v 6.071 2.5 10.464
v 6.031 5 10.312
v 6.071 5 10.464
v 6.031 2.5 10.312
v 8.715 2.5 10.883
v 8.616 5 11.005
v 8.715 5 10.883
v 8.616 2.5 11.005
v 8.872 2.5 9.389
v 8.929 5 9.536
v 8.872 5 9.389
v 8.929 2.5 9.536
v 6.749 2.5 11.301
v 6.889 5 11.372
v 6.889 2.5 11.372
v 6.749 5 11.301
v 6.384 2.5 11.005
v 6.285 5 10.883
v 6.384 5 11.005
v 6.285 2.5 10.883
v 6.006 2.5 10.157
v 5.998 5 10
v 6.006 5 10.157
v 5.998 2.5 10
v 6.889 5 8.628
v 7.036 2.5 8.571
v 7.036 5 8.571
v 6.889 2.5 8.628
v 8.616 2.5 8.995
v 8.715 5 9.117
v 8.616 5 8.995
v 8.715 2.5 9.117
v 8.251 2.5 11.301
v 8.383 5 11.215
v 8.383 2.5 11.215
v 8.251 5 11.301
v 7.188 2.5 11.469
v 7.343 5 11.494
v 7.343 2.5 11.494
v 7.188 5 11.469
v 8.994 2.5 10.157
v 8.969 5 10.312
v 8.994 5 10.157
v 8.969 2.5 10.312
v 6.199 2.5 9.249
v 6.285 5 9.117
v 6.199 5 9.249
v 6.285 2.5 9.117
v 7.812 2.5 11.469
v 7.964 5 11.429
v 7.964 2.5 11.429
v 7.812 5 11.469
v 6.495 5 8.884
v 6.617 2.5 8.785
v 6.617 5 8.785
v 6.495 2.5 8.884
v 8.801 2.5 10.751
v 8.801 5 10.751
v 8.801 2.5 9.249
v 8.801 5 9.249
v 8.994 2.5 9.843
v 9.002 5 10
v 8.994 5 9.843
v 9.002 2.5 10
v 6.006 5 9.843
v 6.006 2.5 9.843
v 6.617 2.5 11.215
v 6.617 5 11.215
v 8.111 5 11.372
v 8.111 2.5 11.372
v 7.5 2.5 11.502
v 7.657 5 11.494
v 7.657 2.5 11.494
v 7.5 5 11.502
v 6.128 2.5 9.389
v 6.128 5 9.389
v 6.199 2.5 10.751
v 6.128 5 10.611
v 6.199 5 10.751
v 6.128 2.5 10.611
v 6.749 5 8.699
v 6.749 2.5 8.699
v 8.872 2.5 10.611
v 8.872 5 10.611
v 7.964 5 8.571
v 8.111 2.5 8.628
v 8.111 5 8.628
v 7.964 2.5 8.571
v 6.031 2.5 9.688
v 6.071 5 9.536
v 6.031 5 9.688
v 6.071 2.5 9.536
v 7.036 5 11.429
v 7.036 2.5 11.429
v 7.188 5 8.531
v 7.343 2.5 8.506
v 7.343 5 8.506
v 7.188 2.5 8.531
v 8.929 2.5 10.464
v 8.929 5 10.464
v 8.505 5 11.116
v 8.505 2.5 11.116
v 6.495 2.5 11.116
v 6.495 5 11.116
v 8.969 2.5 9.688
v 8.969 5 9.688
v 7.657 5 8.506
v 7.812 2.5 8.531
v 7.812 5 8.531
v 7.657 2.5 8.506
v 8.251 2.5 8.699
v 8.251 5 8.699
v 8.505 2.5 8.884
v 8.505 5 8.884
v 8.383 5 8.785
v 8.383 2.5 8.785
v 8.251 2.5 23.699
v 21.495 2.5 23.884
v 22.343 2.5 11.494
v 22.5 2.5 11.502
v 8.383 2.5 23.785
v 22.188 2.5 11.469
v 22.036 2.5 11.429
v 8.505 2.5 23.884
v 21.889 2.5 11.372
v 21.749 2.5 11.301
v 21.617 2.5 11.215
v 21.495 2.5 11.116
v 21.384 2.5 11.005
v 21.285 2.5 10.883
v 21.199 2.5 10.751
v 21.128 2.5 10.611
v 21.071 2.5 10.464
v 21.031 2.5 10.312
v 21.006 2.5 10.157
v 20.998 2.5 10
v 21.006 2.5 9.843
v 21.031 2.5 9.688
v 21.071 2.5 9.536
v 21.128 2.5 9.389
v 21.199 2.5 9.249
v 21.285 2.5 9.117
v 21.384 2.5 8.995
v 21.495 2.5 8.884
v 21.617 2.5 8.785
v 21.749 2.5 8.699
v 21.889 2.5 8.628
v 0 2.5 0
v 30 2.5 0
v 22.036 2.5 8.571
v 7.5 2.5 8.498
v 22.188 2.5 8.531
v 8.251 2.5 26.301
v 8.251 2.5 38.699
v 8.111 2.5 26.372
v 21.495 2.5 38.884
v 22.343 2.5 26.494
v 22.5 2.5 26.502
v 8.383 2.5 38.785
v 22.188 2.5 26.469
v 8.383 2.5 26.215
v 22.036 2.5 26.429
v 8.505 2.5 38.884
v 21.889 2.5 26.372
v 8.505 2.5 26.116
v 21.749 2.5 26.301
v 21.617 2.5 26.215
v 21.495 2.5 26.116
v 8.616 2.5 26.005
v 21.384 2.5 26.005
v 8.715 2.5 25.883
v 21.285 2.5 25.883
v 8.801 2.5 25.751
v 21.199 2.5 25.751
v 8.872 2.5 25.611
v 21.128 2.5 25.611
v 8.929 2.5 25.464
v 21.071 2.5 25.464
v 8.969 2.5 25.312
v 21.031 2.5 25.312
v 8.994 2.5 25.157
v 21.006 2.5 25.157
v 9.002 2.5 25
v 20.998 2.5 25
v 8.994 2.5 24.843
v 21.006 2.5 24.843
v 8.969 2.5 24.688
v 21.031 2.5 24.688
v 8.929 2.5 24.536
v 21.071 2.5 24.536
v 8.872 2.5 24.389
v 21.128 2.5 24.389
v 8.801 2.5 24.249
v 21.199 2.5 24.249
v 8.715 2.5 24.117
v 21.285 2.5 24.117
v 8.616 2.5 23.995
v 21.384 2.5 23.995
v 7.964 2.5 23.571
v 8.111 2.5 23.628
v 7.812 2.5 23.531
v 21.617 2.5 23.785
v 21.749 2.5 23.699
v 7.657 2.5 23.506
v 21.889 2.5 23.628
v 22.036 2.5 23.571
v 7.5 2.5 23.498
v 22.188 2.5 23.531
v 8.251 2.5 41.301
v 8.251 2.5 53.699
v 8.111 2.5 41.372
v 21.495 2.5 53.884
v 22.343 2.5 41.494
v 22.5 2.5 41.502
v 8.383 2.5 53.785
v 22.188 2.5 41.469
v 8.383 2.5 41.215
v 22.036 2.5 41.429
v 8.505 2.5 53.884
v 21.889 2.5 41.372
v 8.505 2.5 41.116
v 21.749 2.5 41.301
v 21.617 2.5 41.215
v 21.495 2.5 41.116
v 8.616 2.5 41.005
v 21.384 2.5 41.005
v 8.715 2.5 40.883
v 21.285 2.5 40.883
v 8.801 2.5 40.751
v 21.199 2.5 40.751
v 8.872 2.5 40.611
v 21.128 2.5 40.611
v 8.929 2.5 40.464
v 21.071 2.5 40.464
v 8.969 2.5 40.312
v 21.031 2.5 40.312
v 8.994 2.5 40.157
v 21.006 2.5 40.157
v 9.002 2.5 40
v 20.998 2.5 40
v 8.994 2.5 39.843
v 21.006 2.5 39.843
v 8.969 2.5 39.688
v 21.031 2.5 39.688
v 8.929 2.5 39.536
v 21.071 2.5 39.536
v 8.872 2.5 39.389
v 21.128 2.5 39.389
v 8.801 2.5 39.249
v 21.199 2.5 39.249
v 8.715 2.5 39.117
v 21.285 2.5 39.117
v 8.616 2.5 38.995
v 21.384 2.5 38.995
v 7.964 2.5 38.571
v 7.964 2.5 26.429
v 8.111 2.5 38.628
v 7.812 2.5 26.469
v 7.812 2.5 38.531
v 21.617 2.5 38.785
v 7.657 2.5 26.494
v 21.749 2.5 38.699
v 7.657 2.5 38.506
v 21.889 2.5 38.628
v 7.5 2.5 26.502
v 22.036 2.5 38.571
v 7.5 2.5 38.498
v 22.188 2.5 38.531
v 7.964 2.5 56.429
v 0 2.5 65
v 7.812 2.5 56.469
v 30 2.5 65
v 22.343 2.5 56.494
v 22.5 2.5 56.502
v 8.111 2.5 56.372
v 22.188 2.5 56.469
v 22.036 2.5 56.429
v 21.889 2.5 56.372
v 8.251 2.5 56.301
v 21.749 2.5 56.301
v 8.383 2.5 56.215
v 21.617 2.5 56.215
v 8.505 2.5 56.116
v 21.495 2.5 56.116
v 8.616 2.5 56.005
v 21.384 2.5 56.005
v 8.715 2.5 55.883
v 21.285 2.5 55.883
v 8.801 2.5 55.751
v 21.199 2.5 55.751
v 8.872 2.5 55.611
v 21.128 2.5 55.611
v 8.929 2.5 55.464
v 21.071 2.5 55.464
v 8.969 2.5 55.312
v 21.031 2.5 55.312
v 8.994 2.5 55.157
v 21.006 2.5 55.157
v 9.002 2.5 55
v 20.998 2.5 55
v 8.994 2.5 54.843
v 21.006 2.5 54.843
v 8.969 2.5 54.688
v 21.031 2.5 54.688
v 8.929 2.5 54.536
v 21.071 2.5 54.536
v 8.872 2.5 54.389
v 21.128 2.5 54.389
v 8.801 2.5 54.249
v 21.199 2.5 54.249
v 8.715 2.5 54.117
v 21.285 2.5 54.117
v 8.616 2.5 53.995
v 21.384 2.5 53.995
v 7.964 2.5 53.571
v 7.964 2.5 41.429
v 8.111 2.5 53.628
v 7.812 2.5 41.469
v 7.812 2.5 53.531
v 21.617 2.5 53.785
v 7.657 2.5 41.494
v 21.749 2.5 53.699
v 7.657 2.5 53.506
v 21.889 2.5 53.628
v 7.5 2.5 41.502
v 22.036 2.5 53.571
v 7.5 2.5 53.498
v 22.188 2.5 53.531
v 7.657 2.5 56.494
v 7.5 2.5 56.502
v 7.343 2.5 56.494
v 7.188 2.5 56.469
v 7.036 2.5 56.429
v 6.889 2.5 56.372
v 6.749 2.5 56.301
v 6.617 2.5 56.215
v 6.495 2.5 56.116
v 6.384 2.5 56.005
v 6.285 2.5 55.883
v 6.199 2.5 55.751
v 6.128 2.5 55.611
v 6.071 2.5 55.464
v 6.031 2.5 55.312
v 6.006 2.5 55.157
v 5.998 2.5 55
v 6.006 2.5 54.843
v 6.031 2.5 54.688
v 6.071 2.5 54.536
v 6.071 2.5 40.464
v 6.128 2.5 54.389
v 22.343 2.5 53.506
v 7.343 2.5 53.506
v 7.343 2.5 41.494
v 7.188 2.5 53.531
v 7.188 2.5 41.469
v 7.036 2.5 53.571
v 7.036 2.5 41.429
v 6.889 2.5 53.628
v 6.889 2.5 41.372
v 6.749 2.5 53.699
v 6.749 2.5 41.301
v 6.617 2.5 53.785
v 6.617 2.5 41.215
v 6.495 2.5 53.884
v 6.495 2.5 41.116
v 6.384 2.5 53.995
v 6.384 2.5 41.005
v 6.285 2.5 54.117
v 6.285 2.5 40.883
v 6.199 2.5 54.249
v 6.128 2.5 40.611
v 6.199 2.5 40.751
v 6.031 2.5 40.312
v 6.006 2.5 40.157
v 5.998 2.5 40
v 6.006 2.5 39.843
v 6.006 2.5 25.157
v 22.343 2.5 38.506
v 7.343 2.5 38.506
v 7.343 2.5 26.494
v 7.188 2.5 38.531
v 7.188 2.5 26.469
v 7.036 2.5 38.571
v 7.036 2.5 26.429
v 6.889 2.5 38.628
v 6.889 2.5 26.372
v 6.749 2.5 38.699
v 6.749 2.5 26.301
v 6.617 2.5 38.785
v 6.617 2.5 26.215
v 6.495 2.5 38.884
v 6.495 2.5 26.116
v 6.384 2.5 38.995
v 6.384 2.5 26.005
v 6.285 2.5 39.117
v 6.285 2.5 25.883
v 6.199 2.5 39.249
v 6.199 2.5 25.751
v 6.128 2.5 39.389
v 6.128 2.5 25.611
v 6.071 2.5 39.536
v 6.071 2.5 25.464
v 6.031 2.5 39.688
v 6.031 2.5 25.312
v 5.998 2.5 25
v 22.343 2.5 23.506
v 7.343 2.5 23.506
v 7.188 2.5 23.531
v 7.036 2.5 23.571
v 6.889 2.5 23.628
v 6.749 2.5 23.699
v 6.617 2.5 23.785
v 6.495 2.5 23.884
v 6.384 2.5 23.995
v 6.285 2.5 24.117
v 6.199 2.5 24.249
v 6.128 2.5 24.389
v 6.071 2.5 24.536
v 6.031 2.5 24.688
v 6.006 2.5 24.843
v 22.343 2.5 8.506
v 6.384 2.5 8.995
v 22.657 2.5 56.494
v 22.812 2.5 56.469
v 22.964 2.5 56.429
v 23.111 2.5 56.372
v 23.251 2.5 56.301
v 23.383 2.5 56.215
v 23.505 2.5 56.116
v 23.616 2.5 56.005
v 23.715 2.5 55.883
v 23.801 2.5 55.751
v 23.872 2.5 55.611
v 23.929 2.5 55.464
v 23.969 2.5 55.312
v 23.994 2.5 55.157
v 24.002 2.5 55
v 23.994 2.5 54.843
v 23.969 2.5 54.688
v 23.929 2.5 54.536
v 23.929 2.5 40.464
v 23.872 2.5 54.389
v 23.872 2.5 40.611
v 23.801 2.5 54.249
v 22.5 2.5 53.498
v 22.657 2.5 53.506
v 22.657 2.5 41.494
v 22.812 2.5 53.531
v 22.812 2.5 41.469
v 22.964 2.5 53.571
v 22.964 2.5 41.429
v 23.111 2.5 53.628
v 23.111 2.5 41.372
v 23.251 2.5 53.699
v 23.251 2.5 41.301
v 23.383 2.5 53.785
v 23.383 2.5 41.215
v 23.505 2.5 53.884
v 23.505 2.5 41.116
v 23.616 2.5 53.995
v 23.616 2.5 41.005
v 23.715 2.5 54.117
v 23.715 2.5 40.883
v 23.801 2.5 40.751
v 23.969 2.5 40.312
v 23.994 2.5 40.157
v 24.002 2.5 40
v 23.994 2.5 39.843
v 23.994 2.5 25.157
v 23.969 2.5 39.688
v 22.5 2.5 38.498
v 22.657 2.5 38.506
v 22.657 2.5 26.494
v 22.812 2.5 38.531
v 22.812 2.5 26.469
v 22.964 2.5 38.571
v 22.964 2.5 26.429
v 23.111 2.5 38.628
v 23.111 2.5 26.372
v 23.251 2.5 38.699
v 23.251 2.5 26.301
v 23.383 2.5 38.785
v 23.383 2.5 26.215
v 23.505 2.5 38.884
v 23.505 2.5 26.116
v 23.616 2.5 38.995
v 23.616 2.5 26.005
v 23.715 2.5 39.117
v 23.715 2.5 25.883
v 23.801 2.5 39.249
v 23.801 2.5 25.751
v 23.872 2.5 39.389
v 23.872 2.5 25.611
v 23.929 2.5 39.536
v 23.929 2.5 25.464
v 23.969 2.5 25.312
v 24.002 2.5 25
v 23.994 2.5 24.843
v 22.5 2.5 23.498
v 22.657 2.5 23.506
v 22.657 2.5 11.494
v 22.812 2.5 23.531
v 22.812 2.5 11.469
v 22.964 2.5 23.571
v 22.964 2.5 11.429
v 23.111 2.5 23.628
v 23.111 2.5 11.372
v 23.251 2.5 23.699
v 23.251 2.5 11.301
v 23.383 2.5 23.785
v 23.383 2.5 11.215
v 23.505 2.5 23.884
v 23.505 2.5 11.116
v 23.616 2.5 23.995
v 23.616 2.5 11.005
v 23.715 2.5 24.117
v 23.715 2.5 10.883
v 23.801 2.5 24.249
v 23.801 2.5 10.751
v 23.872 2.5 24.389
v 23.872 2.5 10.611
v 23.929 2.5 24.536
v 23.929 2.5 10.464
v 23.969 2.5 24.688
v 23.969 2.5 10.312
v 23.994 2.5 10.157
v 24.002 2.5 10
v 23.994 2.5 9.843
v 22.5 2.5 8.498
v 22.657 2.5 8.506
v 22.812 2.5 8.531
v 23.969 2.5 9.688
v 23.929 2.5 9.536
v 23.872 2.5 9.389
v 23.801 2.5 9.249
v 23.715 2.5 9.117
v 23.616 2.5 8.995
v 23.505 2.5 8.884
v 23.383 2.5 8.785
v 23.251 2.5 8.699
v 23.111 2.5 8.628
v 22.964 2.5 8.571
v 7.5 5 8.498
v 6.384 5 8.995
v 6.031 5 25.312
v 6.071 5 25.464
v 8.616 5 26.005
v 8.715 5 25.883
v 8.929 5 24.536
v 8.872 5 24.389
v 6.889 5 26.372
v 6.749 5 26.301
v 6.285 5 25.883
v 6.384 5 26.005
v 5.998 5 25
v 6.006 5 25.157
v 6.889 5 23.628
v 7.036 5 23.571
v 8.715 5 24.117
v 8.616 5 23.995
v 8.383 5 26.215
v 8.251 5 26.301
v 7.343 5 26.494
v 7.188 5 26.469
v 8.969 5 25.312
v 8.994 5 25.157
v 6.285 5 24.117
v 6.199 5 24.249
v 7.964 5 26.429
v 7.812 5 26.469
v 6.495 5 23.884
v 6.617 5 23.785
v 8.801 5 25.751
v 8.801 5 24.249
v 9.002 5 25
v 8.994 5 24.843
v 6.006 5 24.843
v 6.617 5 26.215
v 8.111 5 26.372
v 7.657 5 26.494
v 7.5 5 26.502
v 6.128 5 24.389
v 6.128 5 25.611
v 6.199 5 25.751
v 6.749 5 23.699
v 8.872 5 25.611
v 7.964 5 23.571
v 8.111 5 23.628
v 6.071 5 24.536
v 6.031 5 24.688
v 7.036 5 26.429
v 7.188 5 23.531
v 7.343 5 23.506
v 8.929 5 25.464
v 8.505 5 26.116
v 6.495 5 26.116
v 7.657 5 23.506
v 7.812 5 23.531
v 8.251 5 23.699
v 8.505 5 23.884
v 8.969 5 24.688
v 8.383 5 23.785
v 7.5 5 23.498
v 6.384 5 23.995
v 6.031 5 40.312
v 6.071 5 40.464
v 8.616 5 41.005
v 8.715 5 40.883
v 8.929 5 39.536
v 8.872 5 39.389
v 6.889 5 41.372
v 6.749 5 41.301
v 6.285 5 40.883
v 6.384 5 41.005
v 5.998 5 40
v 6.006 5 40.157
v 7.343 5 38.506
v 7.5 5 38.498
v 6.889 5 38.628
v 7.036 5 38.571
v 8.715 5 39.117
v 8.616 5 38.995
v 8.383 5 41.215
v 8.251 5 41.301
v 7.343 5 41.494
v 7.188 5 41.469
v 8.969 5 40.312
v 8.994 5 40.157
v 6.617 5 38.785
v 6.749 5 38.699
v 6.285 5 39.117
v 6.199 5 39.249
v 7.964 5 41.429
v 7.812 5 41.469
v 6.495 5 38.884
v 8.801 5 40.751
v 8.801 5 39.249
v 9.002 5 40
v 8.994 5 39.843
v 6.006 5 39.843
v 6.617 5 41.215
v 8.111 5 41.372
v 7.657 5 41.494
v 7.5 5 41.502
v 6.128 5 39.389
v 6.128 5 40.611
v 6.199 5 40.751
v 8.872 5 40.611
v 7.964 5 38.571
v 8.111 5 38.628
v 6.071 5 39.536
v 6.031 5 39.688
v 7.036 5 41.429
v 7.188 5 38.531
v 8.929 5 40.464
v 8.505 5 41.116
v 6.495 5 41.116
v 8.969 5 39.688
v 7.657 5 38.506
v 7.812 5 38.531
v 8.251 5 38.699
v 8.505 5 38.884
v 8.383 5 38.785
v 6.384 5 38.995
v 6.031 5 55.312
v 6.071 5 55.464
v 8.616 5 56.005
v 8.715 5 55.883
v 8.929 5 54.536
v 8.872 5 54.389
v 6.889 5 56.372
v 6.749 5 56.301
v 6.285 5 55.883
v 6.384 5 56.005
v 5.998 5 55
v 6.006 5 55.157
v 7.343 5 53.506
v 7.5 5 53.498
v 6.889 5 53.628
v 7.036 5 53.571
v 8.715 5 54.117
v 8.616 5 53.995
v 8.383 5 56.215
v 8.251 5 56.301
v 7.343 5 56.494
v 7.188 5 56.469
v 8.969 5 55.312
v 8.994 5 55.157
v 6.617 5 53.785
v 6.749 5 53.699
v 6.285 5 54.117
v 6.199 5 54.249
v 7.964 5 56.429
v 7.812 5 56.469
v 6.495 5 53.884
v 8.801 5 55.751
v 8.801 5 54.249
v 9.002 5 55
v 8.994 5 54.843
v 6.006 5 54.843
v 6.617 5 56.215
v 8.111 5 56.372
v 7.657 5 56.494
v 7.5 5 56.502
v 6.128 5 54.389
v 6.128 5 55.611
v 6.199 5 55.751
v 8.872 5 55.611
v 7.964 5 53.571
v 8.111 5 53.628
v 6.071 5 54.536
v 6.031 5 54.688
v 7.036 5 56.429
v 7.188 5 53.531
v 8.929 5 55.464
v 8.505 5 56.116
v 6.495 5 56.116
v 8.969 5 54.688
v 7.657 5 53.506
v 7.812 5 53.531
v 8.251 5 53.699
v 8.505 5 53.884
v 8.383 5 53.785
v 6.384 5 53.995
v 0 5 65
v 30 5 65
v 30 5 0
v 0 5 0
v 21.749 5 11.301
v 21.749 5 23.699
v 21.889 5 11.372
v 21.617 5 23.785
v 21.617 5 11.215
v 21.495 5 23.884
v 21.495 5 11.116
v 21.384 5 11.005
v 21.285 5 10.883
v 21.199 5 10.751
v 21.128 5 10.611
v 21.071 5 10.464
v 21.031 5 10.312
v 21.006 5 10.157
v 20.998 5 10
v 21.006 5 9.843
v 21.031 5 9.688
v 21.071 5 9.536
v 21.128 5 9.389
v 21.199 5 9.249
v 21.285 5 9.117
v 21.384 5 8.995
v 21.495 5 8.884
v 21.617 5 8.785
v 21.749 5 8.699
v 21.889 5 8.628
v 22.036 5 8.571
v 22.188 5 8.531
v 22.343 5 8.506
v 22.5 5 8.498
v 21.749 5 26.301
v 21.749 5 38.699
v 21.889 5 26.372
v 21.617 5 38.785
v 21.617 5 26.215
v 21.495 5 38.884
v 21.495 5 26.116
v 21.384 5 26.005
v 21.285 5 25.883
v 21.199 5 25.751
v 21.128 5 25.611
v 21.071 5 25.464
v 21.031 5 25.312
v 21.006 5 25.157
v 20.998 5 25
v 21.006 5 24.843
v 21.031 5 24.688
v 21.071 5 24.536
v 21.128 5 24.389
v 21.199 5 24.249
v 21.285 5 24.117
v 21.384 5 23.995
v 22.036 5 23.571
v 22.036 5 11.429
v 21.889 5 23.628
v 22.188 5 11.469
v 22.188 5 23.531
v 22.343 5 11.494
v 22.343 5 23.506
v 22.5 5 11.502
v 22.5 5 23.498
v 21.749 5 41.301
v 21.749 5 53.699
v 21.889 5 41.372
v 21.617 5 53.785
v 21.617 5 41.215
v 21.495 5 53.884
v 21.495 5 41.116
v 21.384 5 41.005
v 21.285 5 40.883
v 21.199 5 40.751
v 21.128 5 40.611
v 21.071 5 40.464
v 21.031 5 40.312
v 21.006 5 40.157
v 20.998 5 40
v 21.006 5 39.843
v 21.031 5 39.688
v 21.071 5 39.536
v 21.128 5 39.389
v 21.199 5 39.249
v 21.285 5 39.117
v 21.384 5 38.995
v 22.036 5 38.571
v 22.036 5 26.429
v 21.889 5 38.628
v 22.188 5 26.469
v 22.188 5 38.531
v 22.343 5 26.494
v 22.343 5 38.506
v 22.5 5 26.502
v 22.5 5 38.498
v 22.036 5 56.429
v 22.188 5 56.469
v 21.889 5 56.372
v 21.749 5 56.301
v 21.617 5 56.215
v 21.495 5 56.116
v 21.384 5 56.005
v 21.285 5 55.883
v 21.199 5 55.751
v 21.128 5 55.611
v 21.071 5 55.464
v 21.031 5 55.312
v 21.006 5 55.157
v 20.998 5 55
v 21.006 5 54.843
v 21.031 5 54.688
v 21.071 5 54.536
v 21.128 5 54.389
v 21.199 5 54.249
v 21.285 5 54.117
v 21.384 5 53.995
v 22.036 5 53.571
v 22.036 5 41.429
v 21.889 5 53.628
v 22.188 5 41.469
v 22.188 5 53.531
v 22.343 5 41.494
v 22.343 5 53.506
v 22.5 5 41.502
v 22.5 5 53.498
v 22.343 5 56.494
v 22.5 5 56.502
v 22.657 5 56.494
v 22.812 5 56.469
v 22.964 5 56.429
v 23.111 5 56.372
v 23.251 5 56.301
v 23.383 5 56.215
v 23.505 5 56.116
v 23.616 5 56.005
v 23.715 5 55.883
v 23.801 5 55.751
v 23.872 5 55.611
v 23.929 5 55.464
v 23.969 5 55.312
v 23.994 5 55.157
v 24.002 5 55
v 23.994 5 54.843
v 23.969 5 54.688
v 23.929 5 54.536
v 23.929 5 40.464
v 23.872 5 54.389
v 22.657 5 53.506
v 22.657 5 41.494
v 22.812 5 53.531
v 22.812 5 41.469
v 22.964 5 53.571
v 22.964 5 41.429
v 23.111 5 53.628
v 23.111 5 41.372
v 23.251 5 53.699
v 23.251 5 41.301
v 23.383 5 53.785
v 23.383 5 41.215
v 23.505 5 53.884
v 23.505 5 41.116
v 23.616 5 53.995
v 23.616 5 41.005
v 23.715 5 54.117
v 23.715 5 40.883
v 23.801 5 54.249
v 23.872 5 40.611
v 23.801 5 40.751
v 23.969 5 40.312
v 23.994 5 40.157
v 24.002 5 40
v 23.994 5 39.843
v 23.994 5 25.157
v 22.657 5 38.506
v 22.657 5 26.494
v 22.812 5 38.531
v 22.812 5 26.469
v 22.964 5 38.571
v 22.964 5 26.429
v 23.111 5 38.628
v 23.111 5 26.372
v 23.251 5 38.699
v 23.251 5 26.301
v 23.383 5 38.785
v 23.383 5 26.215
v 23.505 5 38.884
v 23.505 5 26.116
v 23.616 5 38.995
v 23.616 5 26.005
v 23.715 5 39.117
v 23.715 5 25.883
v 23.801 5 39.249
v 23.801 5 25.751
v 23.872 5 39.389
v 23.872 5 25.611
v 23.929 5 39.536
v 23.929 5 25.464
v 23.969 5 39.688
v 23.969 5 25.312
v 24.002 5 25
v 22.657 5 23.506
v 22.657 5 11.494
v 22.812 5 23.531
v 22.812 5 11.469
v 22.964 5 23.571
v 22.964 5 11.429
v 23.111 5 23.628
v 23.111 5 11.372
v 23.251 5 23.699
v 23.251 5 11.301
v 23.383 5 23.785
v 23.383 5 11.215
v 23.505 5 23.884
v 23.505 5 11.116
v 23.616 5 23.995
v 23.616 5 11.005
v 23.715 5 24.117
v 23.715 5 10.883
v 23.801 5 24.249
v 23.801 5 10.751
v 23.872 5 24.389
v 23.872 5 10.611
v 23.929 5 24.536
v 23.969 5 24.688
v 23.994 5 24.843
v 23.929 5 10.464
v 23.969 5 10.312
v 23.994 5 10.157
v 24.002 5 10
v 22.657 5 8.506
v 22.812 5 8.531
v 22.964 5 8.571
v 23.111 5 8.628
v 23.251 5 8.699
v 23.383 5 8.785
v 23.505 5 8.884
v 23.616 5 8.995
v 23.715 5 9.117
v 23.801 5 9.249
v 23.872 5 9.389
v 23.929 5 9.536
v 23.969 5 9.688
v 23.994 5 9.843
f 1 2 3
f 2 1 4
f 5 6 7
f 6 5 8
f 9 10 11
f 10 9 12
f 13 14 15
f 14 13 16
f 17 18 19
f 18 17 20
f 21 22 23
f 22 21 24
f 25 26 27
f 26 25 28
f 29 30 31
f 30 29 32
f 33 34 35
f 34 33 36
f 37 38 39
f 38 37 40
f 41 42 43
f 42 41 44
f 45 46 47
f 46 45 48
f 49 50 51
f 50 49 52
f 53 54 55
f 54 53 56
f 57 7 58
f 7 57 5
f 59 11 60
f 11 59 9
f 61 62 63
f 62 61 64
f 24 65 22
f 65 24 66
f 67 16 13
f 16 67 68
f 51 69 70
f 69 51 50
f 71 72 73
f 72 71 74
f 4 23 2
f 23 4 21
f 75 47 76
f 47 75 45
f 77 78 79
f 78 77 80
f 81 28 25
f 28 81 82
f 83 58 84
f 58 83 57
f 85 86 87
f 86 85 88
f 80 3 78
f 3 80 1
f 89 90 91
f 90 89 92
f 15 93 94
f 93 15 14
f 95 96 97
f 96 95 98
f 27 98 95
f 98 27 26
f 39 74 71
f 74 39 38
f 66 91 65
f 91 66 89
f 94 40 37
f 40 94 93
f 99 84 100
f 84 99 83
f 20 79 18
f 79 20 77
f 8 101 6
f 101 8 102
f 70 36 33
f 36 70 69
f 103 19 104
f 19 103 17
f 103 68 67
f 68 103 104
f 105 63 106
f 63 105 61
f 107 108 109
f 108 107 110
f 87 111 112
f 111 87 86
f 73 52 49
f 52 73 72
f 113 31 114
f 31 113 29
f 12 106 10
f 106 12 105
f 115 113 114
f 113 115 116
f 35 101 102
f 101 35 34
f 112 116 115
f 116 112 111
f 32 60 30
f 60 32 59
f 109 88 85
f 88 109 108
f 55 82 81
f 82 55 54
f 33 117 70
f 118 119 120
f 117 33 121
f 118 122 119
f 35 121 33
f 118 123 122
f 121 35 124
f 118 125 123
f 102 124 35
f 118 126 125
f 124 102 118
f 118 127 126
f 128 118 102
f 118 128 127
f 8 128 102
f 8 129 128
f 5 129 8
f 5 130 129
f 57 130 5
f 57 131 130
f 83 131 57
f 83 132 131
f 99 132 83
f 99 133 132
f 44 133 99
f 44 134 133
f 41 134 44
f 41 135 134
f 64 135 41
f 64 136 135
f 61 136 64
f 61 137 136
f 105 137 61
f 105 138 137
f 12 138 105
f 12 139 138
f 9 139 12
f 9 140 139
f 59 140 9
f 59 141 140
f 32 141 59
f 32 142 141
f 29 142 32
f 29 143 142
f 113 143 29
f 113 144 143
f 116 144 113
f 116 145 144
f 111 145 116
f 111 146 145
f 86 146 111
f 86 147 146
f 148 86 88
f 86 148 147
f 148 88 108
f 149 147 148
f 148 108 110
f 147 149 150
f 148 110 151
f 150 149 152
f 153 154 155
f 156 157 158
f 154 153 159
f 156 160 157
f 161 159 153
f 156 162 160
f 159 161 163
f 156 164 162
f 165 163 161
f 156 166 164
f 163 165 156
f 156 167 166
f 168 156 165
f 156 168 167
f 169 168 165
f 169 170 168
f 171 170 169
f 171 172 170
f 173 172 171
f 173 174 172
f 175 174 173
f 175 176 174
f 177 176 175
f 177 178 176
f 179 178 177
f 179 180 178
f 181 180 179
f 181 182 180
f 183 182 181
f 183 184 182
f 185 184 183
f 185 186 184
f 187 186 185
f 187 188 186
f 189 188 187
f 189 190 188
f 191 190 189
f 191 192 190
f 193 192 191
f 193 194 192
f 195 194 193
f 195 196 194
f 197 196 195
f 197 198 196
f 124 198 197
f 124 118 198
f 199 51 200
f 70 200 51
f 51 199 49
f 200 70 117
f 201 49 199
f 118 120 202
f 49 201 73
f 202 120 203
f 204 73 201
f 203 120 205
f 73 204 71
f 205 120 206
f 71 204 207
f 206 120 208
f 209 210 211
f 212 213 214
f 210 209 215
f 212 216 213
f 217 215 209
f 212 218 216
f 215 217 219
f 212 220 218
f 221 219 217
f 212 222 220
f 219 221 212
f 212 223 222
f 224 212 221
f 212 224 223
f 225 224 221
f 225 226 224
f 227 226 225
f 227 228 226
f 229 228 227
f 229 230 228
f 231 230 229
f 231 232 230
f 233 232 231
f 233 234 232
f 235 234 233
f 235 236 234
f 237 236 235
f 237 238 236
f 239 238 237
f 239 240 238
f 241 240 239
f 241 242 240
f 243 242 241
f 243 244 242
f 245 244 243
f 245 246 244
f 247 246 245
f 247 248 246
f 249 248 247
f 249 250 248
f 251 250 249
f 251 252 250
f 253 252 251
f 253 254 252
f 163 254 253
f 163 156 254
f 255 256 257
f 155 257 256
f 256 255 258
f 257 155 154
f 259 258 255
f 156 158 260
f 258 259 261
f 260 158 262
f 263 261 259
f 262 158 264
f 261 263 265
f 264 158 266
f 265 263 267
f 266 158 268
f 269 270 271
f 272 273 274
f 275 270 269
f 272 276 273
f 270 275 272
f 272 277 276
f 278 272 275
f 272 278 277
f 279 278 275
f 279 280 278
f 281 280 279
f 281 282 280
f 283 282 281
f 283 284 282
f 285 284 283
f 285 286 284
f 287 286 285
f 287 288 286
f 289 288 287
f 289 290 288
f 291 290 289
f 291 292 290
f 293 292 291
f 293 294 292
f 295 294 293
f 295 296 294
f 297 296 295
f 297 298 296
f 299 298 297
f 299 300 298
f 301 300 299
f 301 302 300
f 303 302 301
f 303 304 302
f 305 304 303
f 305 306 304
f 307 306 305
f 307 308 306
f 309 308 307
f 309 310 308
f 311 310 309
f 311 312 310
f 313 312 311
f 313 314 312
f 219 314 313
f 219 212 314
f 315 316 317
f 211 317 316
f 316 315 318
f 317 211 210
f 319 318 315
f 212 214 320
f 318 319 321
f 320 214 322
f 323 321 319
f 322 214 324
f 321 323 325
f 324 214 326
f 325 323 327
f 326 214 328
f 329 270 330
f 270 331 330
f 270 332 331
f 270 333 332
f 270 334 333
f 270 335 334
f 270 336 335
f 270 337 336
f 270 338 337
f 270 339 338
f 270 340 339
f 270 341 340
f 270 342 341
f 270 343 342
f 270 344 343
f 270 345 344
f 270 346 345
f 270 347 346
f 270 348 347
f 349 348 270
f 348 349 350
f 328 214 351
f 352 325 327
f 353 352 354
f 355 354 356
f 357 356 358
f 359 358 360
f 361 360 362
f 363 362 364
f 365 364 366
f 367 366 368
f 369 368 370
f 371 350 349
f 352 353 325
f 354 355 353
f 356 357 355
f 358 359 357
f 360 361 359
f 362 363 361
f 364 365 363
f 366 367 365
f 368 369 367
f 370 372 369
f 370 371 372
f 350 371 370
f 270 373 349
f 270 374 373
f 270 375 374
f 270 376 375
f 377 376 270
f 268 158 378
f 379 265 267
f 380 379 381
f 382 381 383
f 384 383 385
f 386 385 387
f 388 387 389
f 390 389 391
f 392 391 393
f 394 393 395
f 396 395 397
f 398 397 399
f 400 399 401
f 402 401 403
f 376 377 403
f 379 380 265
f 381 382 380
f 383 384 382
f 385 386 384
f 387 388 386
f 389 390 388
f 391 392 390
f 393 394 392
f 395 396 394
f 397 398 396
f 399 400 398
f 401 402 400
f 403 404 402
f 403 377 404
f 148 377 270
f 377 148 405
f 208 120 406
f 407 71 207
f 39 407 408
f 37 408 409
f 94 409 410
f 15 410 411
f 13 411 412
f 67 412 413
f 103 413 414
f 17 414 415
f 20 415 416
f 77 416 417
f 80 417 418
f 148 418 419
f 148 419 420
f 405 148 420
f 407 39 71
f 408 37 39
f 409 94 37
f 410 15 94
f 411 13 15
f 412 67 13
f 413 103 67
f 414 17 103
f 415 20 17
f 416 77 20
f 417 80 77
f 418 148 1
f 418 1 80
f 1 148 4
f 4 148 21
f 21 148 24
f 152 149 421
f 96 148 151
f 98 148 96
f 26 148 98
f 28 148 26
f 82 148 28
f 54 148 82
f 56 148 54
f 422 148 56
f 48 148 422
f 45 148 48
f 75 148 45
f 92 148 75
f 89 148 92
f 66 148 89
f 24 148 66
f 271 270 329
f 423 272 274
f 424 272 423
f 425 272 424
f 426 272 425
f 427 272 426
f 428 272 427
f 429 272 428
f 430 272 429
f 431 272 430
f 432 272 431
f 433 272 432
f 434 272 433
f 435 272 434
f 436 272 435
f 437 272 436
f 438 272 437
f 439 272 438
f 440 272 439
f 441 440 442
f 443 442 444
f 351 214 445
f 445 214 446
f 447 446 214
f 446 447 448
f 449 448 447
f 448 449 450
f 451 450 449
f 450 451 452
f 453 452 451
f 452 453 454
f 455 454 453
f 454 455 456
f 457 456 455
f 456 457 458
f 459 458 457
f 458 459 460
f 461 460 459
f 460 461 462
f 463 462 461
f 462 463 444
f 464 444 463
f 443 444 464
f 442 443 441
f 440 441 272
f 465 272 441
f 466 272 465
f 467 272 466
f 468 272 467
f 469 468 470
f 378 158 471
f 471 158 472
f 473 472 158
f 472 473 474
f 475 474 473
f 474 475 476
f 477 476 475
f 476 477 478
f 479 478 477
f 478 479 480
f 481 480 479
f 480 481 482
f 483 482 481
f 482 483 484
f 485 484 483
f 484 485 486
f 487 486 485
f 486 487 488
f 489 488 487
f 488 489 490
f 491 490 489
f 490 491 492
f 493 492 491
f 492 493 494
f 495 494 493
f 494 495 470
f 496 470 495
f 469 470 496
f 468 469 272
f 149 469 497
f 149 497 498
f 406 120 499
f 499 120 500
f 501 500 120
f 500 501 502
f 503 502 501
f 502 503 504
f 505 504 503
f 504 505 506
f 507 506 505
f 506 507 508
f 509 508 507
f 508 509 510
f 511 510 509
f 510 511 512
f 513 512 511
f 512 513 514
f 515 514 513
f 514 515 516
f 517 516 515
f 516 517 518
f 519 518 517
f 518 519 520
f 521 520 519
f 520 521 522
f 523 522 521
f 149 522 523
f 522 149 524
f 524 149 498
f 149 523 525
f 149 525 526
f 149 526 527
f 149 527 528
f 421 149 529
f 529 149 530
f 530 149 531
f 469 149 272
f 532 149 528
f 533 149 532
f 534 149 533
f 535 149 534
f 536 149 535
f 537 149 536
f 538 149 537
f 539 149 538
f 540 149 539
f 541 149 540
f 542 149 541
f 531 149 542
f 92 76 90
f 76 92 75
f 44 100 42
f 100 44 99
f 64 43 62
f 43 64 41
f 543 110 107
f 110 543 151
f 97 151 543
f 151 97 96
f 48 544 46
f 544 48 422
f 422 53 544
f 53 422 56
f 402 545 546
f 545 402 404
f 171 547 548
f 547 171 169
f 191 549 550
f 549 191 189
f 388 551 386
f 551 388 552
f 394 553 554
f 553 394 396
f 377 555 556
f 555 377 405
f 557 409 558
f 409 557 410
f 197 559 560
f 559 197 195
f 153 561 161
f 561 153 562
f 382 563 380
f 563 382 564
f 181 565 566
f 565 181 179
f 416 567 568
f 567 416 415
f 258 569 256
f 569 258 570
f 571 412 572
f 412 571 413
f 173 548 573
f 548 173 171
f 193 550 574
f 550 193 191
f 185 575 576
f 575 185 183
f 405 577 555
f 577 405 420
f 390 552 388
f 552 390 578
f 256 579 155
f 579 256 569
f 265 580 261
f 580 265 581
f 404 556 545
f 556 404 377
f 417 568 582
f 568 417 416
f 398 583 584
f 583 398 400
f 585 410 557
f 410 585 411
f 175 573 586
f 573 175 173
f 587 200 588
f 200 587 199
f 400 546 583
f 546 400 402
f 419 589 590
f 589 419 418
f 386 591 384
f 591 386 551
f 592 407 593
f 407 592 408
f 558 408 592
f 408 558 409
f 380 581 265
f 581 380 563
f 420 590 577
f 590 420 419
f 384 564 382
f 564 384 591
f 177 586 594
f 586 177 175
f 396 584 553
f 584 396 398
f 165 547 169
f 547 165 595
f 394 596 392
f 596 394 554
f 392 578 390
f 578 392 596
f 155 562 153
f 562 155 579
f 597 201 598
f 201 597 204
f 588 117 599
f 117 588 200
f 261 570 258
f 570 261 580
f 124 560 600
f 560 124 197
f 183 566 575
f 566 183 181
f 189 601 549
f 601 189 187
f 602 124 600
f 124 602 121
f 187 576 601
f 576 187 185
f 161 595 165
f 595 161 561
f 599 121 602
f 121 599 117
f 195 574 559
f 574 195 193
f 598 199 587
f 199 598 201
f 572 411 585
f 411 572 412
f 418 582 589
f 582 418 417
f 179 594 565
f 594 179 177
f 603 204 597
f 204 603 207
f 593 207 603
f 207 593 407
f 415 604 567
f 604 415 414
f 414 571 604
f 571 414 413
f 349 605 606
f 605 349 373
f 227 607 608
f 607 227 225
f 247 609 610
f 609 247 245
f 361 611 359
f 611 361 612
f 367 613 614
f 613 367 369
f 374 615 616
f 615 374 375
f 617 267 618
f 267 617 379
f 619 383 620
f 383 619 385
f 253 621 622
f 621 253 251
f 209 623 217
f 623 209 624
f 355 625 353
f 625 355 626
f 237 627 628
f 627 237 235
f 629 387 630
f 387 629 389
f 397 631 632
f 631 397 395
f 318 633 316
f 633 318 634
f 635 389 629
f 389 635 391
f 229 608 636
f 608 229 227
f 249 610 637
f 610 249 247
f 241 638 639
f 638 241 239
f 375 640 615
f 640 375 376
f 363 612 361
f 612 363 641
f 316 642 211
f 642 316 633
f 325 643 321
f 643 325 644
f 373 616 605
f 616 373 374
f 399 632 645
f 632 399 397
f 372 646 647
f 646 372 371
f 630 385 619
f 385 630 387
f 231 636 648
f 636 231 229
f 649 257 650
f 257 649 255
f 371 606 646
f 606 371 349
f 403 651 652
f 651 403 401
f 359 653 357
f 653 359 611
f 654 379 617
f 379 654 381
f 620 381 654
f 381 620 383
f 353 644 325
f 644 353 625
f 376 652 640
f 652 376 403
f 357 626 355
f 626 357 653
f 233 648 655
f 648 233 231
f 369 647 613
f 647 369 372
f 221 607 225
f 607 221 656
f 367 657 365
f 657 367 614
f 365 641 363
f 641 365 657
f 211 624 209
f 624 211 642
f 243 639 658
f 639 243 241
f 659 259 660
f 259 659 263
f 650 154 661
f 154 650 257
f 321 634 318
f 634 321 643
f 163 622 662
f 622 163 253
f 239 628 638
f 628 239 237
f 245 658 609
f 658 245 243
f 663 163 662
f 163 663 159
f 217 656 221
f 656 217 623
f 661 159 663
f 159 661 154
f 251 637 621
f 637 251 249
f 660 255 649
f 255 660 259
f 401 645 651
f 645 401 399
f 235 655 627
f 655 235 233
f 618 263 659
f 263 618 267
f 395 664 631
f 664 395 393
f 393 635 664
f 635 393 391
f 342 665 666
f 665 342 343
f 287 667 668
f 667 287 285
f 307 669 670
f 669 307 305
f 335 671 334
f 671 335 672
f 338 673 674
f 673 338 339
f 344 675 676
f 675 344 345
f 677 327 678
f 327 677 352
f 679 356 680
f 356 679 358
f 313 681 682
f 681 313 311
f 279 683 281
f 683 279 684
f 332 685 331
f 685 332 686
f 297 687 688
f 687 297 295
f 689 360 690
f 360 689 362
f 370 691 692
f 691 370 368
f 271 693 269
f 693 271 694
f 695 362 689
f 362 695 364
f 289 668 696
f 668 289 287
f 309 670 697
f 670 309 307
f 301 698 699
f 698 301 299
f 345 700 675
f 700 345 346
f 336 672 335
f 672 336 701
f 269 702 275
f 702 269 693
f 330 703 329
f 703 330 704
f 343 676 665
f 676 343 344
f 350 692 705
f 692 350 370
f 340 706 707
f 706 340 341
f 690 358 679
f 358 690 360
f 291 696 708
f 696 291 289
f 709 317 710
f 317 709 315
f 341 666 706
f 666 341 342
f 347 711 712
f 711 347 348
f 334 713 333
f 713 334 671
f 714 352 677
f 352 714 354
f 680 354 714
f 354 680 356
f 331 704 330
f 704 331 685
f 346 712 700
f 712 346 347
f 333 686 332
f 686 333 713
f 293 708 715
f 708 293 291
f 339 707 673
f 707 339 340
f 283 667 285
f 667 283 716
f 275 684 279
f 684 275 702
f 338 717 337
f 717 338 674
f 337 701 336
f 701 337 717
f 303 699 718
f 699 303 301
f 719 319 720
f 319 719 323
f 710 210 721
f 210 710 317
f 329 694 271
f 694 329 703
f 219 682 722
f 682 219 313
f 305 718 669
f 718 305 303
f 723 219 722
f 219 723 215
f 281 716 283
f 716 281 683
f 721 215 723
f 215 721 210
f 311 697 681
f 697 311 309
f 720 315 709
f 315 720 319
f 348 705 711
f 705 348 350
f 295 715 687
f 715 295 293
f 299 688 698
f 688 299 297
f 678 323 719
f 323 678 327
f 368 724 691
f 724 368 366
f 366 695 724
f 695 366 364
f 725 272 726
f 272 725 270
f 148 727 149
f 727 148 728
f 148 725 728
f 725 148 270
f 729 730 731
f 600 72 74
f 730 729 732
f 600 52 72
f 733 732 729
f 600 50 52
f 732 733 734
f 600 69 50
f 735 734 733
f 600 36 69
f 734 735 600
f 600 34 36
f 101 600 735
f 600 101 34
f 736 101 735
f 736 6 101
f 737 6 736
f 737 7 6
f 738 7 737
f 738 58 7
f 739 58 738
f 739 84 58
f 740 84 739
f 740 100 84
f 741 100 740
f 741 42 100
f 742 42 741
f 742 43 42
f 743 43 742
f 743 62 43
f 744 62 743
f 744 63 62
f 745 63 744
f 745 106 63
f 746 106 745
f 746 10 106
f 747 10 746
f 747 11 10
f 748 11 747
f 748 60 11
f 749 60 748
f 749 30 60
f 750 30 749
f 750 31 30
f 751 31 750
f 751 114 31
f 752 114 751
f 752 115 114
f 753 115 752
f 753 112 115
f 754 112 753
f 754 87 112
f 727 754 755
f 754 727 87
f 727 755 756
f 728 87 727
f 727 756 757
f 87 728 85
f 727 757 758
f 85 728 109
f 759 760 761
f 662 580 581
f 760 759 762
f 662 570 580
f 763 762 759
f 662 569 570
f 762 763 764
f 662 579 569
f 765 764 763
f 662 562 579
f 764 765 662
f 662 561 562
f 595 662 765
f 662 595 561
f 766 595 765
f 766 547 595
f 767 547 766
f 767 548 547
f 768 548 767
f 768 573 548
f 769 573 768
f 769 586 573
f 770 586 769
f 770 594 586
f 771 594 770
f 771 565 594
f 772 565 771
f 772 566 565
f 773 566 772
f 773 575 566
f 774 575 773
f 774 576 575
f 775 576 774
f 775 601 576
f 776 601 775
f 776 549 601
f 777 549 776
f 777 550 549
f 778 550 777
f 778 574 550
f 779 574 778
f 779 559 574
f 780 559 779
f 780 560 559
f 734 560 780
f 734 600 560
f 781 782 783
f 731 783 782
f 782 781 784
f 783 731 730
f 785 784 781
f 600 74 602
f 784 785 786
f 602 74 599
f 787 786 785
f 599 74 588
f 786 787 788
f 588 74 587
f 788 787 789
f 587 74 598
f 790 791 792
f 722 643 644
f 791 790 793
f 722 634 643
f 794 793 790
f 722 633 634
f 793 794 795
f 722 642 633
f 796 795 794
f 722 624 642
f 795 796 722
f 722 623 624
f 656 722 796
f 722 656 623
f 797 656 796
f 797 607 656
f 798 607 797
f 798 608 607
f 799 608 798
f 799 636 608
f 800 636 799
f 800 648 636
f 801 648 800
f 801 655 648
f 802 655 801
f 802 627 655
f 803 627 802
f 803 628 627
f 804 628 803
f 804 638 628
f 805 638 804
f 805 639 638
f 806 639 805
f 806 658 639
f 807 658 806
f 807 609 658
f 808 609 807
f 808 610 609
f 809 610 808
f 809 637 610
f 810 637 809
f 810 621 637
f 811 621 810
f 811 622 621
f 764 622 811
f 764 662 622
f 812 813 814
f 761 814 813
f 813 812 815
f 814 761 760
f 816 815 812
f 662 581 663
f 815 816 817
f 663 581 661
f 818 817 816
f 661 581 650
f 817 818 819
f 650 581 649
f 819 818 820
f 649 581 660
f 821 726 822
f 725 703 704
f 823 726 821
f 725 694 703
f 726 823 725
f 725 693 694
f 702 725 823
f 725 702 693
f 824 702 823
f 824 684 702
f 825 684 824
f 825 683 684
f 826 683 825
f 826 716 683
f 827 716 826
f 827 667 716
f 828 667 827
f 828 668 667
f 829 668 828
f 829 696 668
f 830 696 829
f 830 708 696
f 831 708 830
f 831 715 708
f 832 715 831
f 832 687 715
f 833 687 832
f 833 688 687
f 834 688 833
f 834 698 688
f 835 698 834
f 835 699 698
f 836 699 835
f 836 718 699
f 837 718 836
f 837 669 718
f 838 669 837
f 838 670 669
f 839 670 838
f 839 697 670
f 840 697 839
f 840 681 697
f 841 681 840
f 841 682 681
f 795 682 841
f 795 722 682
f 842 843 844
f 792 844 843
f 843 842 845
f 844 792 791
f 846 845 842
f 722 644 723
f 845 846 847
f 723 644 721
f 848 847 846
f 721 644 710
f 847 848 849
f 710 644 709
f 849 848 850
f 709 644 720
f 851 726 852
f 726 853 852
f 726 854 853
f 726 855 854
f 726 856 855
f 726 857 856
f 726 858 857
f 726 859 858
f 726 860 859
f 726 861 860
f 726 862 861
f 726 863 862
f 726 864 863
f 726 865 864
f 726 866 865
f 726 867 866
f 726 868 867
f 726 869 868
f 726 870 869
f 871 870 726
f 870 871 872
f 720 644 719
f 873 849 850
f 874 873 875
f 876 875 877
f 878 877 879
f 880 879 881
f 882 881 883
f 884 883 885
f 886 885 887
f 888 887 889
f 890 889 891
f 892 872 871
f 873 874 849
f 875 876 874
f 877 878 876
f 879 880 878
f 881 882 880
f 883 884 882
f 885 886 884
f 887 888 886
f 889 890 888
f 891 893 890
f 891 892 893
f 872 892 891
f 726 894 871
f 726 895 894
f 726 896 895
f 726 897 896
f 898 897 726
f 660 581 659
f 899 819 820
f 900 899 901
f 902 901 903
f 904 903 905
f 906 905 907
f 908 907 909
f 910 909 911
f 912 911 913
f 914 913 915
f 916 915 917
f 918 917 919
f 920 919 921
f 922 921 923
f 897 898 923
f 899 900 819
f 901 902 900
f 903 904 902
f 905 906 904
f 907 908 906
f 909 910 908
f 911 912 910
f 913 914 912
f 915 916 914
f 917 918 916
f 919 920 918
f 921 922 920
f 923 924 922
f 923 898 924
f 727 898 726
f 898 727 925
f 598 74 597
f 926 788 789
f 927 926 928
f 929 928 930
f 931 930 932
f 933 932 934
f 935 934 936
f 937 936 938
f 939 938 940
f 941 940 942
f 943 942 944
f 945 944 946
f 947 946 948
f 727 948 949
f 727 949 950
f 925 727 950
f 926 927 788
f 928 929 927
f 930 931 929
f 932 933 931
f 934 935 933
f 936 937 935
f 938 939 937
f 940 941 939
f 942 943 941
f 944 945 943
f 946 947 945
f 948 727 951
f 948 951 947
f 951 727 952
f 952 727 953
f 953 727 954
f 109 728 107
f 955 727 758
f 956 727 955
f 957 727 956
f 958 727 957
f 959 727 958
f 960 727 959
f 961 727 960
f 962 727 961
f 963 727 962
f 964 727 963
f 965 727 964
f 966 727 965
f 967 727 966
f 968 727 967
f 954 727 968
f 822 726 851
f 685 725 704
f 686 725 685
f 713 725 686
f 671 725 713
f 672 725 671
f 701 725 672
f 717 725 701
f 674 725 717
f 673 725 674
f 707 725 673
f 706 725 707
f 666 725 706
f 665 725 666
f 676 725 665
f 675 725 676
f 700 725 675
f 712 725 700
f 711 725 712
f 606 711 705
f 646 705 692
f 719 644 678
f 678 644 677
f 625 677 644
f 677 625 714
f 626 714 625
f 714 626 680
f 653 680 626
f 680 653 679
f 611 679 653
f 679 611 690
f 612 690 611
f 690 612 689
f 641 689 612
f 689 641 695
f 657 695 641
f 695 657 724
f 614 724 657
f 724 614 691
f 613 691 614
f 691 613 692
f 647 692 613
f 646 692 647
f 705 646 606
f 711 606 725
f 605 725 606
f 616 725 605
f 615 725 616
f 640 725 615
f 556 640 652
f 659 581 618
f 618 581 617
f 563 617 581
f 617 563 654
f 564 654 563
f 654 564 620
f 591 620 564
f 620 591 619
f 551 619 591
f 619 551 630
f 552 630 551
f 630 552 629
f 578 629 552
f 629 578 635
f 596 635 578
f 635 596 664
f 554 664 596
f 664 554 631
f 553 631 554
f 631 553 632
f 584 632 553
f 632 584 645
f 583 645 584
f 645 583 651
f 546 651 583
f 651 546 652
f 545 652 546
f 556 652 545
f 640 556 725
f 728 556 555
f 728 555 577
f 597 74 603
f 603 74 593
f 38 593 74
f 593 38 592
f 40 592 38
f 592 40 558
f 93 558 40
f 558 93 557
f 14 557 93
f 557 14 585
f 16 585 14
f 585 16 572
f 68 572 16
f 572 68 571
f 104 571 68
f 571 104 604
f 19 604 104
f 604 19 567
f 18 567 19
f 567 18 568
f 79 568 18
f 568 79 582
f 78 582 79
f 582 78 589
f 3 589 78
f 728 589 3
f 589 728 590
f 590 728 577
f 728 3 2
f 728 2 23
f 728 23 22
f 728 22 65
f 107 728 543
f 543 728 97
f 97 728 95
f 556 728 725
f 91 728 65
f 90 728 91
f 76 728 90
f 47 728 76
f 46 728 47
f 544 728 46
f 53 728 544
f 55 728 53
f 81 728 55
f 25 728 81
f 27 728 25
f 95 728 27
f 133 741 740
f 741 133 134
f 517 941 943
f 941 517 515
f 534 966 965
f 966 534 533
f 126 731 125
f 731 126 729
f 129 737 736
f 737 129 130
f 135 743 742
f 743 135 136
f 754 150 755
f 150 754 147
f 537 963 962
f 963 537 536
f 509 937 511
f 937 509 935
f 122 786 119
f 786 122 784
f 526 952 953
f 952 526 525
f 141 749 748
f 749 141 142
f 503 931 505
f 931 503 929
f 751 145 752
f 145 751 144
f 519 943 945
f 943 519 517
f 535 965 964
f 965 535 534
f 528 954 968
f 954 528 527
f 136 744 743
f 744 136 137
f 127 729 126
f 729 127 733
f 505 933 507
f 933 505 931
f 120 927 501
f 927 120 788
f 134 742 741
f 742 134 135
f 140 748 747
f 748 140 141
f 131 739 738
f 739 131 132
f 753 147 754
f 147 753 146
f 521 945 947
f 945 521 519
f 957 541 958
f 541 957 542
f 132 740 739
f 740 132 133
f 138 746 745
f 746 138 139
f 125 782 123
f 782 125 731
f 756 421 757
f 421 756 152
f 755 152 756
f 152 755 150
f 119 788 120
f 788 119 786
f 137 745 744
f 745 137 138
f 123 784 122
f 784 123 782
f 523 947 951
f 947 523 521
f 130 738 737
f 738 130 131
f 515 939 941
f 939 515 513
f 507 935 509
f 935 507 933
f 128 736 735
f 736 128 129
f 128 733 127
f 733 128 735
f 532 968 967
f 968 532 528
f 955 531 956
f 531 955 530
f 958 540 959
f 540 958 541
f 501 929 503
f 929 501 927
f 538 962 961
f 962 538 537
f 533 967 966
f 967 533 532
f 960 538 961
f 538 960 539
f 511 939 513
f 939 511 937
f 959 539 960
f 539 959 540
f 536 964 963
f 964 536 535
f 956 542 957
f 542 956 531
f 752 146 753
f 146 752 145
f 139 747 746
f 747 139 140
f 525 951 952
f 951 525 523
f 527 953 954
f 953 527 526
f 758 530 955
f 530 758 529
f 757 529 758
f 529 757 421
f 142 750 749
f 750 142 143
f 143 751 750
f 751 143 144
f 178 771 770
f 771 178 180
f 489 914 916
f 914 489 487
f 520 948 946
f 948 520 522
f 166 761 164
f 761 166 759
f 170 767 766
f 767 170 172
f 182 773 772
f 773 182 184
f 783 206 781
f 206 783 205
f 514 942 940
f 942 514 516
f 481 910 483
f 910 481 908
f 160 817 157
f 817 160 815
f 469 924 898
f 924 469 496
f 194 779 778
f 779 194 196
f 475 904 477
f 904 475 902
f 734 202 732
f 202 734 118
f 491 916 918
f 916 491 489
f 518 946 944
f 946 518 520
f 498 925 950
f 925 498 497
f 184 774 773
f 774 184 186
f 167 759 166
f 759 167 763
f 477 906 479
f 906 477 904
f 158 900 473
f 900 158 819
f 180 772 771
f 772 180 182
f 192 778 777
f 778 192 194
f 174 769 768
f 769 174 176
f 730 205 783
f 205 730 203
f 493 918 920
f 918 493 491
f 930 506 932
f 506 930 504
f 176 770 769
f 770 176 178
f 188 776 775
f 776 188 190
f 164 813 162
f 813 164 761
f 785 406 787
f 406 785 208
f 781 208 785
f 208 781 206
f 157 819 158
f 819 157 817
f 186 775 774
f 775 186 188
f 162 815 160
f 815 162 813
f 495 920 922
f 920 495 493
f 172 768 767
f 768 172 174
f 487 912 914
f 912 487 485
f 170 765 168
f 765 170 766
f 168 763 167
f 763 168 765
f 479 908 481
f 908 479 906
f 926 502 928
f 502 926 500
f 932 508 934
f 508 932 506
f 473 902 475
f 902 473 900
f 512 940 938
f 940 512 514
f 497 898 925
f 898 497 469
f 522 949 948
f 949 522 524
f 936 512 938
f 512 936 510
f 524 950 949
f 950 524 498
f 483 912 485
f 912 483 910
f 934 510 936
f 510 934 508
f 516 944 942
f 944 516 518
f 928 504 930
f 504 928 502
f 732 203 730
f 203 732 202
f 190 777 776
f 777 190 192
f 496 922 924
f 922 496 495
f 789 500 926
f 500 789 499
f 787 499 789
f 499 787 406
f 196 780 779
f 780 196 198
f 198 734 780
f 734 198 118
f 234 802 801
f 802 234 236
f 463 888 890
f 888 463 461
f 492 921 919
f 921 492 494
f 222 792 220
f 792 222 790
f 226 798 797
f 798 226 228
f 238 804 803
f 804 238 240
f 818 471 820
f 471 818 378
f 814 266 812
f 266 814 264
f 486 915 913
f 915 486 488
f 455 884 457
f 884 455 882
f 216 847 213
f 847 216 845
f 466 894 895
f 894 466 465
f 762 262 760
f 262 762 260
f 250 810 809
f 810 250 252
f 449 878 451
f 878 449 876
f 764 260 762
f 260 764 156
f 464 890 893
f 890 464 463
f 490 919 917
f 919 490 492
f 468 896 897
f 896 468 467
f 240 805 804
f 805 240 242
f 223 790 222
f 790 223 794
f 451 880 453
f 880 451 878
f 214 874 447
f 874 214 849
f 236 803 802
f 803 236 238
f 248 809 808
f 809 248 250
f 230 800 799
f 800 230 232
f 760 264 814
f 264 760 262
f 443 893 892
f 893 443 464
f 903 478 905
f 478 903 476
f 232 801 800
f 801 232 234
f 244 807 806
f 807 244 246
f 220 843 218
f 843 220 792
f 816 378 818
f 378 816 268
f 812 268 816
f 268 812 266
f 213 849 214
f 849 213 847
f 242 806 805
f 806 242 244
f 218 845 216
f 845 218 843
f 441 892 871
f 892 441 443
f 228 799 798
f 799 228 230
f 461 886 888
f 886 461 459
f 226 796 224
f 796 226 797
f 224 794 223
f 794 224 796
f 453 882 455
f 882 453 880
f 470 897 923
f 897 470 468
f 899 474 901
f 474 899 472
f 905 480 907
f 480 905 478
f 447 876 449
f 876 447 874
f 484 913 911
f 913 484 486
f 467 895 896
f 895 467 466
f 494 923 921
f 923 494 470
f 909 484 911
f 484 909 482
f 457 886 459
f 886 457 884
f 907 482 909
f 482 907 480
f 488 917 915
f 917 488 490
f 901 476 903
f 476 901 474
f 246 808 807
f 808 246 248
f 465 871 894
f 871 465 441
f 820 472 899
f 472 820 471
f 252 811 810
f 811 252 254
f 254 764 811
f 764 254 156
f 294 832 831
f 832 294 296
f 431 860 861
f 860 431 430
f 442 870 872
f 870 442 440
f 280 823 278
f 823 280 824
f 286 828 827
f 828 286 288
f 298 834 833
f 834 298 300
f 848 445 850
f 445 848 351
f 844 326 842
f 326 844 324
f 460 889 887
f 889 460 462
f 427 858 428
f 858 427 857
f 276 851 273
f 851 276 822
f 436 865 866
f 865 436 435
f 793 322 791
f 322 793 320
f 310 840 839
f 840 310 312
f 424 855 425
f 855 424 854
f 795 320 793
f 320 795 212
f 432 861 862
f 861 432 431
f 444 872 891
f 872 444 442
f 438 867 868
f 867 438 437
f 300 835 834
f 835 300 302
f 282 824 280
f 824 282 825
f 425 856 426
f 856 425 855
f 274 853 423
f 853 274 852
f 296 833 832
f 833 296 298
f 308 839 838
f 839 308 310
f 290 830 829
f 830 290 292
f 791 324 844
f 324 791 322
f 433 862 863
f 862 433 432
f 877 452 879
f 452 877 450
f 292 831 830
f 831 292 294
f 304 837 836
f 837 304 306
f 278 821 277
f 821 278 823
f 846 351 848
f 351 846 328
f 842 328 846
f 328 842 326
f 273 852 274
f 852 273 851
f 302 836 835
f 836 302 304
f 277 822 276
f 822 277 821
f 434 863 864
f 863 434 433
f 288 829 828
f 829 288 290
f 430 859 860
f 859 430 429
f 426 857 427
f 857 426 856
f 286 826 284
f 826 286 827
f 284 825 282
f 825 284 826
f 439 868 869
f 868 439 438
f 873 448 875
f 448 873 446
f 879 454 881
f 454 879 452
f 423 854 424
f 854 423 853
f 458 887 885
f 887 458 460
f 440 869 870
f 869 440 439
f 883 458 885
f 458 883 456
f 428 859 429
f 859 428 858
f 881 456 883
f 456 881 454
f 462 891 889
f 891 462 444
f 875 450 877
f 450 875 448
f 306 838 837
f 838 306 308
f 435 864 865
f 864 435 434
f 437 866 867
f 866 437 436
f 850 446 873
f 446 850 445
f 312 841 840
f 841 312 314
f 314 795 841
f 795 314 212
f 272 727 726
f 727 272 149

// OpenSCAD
// file: Constants.scad
standHeight = 65;
aluminumHeight = 20;
aluminumWidth = 20;
standHoleCount = 4;
standLargeScrewOffset = 10;
standThickness = 5;
standFlangeWidth = 15;
standFlangeHoleOffset = 10;
topRailHoleOffset = 10;

standFlangeThickness = standThickness / 2;
standFlangeHoleLength = (standHeight - (standFlangeHoleOffset * 2));
standFlangeHoleStep = (standHeight - (standFlangeHoleOffset * 2)) / (standHoleCount - 1);
// file: Common.scad
include <Constants.scad>;

module polyhole(h, d)
{
    n = max(round(20 * d), 3);

    rotate([0,0,180])
    {
        cylinder(h = h, r = (d / 2) / cos (180 / n), $fn = n);
    }
}

module 3mmScrew()
{
    polyhole(h = standThickness, d = 3);
}

module 5mmScrew()
{
    polyhole(h = standThickness, d = 5);
}

module outsideFlange()
{
    difference()
    {
        cube([standFlangeWidth, standFlangeThickness, standHeight]);
        for (offset = [0: standFlangeHoleStep: standFlangeHoleLength])
        {
            echo (offset);
            translate([standFlangeWidth / 2, 0, standFlangeHoleOffset + offset])
            {
                rotate([-90, 0, 0])
                {
                    3mmScrew();
                }
            }
        }
    }
}

module outsideXFlange()
{
    outsideFlange();
}

module outsideYFlange()
{
    rotate([0,0,90])
    {
        translate([0, -standFlangeThickness, 0])
        {
            outsideFlange();
        }
    }
}

module insideXFlange()
{
    translate([0, standFlangeThickness, 0])
    {
        outsideFlange();
    }
}

module insideYFlange()
{
    rotate([0,0,90])
    {
        translate([0, -standFlangeThickness * 2, 0])
        {
            outsideFlange();
        }
    }
}

module topRail(width)
{
    echo(width);
    assert(width >= topRailHoleOffset * 3, "Panel width is too small");
    
    topRailHoleCount = max(round(width / (topRailHoleOffset * 2)), 2);
    topRailHoleLength = (standHeight - (topRailHoleOffset * 2));
    topRailHoleStep = (standHeight - (topRailHoleOffset * 2)) / (topRailHoleCount - 1);
    echo("heha");
    echo(topRailHoleCount);

    translate([0, 0, standHeight])
    {
        difference()
        {
            cube([width, standThickness, aluminumHeight]);

            for (offset = [0: topRailHoleStep: topRailHoleLength])
            {
                echo (offset);
                translate([offset + topRailHoleOffset, 0, aluminumHeight / 2, ])
                {
                    rotate([-90, 0, 0])
                    {
                        5mmScrew();
                    }
                }
            }            
        }
    }
}
// main file
include <Common.scad>;

union()
{
    insideXFlange();
    translate([standFlangeWidth, 0, 0])
    {
        insideXFlange();
    }
}
